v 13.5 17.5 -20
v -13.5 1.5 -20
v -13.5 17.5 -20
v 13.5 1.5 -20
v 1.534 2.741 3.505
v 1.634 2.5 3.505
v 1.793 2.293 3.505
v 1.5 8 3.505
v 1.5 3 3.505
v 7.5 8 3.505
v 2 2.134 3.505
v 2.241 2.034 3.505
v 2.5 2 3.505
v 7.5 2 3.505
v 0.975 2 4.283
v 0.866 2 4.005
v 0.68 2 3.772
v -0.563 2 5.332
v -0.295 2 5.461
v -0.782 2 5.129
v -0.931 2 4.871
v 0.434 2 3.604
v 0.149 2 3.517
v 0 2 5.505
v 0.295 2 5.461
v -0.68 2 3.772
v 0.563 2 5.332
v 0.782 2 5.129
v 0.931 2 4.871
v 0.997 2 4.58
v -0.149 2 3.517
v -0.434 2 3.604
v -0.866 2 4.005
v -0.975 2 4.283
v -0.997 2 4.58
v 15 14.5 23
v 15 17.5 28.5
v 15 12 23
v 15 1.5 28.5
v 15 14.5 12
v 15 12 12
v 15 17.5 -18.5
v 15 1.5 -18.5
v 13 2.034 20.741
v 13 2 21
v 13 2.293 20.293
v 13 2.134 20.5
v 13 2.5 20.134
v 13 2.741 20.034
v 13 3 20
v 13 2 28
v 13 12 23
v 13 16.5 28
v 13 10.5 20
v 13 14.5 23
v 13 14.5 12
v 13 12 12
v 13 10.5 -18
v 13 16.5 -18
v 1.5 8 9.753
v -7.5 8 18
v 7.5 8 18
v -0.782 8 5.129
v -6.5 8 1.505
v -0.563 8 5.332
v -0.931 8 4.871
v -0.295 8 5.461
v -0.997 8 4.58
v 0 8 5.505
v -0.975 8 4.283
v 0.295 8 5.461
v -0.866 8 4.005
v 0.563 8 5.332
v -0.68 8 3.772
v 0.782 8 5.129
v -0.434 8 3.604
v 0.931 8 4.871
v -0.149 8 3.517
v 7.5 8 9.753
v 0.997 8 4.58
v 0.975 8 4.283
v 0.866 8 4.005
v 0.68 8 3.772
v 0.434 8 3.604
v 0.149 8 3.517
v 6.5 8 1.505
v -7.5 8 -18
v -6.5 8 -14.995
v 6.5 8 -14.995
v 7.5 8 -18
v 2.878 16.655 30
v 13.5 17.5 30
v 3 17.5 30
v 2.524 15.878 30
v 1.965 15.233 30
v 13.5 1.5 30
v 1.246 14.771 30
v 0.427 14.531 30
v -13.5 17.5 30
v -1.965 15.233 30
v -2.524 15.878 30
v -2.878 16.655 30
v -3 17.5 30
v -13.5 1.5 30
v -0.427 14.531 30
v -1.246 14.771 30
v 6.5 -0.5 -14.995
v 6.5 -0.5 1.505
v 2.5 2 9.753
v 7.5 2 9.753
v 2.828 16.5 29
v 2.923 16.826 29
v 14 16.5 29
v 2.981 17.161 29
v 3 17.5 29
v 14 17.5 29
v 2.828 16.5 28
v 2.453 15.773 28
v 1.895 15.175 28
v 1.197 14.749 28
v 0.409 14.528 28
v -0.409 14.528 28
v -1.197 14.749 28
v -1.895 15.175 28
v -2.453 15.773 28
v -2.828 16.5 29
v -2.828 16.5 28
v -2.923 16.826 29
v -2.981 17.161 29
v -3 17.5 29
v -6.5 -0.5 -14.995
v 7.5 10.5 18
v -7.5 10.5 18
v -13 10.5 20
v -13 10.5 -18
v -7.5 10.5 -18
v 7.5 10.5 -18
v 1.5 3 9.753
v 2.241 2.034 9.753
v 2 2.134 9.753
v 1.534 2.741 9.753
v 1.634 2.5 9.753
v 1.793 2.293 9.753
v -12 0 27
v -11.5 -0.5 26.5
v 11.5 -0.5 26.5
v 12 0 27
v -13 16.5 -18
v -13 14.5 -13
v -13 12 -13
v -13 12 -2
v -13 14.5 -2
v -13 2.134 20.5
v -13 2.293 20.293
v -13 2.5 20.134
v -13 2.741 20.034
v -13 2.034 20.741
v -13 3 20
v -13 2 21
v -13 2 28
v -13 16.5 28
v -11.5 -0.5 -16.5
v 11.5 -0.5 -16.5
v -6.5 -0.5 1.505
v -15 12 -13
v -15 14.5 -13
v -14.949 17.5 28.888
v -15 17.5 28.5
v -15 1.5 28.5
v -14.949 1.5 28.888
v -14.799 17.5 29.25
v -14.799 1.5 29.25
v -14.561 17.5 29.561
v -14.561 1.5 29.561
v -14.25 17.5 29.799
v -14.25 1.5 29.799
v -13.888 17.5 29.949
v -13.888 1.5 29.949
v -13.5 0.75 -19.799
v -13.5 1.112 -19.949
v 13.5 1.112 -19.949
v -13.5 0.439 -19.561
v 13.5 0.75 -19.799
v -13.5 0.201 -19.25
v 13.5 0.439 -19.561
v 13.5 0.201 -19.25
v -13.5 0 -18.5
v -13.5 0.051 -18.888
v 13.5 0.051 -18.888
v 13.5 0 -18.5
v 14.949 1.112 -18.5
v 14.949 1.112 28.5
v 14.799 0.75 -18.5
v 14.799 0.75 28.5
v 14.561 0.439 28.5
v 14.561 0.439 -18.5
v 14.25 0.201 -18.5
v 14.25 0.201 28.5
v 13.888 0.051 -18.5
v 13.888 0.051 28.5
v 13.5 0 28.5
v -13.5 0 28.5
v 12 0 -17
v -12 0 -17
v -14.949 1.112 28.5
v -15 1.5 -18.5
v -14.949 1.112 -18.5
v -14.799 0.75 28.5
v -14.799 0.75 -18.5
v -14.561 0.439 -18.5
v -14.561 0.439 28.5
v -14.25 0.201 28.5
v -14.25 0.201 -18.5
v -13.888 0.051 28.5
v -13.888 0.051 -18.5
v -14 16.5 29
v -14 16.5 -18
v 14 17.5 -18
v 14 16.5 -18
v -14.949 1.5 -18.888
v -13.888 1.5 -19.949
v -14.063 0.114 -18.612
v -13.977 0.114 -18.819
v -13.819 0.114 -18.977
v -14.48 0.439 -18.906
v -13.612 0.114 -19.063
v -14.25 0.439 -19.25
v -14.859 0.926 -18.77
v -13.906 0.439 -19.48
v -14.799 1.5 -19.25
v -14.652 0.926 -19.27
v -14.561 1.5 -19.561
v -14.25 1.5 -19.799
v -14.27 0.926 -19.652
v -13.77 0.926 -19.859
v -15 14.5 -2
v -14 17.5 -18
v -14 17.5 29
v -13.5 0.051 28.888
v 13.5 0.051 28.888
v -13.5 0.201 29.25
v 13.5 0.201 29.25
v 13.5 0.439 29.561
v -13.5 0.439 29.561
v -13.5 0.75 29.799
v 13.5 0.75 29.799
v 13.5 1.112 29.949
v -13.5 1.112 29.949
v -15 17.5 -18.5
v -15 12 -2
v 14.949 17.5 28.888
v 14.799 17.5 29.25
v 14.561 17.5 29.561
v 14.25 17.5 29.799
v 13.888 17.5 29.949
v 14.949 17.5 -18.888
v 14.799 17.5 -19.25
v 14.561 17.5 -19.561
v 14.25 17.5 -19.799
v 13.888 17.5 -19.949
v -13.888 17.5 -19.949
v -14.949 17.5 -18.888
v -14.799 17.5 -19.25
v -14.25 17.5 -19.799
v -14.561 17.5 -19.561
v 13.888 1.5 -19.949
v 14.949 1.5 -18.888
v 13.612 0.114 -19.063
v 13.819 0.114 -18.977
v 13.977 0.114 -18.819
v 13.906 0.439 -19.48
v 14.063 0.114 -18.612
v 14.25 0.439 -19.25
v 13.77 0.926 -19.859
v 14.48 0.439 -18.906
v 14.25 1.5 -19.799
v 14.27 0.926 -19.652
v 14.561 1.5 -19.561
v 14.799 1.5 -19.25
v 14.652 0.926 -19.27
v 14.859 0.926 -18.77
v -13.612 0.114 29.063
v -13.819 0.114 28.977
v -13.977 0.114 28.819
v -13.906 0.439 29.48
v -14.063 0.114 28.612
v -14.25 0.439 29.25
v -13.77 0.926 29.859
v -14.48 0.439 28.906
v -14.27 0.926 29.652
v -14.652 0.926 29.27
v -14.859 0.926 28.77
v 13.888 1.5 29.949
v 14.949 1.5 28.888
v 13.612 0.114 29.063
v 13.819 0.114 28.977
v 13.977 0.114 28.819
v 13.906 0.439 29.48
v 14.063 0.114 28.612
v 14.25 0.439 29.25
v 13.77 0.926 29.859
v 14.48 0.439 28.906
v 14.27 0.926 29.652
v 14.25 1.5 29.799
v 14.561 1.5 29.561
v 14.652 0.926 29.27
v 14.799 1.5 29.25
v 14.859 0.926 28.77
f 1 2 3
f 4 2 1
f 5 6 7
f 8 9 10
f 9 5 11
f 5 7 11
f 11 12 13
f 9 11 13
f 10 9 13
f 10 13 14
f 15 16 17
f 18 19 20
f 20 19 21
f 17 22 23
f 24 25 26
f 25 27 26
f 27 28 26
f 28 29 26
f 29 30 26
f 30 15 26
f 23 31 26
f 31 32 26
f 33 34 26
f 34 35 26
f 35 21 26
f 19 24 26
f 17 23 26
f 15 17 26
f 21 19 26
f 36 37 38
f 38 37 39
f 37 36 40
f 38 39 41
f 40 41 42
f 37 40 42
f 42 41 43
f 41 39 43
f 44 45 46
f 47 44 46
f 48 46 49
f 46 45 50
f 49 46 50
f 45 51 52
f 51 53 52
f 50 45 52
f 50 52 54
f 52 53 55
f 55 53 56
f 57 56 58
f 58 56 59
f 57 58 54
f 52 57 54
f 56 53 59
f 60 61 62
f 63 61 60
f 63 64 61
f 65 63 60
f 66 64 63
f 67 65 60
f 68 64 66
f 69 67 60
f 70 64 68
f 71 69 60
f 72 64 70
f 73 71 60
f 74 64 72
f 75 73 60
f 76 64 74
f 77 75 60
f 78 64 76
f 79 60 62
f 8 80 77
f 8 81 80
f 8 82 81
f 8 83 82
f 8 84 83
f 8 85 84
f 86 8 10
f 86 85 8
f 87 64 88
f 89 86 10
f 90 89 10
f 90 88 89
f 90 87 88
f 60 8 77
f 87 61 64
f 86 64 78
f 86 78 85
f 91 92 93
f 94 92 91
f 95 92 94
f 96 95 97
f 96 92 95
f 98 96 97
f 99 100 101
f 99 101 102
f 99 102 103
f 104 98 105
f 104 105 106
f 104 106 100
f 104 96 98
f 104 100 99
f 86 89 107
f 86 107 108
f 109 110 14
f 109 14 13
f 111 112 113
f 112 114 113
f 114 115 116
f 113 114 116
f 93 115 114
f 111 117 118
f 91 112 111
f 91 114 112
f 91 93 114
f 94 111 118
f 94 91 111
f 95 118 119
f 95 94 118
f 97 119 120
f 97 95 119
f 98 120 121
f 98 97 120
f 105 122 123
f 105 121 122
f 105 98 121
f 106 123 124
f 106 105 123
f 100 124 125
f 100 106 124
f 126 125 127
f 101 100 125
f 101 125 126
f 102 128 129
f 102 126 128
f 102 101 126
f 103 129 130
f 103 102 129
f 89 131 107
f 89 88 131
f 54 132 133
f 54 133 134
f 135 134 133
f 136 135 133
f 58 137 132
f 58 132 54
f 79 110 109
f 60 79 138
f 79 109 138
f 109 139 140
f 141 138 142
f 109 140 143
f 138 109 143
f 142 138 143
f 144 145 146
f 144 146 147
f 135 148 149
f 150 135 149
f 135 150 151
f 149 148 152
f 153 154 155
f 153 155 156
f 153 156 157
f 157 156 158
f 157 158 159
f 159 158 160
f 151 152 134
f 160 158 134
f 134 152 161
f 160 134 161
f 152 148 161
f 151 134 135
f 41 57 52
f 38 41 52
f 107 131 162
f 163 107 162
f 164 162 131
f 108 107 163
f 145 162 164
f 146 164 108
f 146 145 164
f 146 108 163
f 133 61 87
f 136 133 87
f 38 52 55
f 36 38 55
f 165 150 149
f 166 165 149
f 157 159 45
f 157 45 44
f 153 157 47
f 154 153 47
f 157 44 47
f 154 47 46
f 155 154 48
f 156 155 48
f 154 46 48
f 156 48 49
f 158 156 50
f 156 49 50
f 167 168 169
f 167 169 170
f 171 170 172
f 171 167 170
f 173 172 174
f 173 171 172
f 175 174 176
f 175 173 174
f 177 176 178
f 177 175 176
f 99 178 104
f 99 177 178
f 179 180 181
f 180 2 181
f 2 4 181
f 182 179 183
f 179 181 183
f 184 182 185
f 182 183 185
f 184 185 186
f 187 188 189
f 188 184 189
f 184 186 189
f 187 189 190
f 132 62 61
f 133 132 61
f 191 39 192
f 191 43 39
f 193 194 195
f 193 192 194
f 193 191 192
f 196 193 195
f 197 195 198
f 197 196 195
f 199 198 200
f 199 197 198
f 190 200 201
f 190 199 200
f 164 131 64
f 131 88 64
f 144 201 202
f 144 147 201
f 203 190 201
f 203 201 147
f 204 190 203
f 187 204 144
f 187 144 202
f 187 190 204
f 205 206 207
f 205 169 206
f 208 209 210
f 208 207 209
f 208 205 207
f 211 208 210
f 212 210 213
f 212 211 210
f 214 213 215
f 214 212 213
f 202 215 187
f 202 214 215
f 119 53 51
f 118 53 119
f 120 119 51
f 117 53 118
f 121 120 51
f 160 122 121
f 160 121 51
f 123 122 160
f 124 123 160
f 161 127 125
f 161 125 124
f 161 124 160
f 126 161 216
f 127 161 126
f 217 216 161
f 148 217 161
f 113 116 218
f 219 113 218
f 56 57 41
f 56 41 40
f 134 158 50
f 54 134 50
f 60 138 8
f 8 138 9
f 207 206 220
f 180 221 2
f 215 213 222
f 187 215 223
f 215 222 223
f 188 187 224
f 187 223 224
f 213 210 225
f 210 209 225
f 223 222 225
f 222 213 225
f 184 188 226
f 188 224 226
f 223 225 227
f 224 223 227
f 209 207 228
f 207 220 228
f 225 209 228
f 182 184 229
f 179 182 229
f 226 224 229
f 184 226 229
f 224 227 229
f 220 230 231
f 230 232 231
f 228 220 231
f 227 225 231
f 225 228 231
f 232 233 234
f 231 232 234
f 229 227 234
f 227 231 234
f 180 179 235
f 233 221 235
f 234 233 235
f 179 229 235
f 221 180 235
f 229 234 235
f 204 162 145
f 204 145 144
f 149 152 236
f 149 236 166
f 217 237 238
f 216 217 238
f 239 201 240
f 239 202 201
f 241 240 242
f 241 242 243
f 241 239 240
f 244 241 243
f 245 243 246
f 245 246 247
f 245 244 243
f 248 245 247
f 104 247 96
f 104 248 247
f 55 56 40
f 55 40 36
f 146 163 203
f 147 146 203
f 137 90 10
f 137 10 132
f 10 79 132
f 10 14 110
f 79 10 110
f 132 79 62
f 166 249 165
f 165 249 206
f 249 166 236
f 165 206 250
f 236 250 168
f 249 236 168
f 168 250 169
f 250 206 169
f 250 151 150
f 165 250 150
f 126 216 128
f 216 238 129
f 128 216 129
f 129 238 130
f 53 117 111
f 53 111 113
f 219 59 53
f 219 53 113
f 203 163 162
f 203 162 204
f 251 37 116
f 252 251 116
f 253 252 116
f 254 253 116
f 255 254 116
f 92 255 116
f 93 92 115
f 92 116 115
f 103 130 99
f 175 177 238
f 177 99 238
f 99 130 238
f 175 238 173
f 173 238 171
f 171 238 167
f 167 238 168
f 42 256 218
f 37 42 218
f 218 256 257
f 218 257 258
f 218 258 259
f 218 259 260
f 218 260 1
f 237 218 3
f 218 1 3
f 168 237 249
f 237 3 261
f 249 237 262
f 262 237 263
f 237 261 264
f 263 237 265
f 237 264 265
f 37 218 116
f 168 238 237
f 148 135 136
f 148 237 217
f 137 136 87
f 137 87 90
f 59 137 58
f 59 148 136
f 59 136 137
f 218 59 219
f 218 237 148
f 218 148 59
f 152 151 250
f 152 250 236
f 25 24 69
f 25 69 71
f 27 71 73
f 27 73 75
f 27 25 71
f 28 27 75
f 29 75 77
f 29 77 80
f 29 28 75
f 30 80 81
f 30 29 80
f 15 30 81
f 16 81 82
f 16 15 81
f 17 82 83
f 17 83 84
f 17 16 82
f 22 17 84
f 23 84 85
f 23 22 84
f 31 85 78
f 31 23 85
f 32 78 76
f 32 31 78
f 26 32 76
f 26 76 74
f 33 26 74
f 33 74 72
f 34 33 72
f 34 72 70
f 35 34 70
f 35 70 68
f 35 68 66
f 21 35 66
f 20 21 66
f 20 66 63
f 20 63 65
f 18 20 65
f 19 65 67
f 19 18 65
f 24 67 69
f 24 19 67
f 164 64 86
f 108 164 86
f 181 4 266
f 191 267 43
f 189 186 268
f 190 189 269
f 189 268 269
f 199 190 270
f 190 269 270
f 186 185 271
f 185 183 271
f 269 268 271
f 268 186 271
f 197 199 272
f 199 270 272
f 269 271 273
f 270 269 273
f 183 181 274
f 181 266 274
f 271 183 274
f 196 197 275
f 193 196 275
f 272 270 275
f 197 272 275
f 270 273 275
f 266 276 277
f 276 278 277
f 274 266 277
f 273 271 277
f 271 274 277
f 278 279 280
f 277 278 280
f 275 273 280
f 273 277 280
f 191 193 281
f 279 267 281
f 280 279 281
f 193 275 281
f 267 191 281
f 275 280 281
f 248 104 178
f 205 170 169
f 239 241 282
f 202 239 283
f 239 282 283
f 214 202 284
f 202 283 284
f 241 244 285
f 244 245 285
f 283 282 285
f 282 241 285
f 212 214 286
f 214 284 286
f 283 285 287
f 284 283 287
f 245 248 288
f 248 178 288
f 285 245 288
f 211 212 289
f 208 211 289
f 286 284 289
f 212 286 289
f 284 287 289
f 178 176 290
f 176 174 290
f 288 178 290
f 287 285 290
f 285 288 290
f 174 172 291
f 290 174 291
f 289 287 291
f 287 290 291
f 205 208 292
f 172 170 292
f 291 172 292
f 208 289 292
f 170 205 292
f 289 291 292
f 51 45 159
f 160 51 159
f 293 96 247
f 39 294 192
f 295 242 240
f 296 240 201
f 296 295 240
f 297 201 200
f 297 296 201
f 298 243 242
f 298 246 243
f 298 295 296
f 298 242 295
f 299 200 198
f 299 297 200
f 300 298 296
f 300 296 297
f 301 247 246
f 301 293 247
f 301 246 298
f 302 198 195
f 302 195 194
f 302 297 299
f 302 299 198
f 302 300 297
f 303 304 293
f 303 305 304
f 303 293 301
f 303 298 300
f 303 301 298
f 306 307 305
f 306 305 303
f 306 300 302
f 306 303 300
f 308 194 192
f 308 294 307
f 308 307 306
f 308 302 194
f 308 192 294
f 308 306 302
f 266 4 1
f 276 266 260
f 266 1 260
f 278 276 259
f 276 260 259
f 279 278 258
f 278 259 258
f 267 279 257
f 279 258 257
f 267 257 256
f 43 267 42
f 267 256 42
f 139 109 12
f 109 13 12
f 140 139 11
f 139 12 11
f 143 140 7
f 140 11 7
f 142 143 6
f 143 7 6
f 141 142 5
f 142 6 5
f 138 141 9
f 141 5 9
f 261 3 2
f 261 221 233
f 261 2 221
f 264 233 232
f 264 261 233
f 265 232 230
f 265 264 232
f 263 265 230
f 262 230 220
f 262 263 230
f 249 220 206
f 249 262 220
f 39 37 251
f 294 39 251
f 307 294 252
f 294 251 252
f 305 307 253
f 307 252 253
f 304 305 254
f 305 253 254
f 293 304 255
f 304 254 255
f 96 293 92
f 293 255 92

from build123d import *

# Parameters (mm, degrees)
BOSS_EXTRUDE1_DEPTH  = 17.5
CUT_EXTRUDE1_DEPTH   = 15.5
FILLET2_R            = 1.5
CUT_EXTRUDE4_REACH   = 46.612
SKETCH5_W            = 11
SKETCH5_H            = 2.5
CUT_EXTRUDE5_REACH   = 46.612
SKETCH6_W            = 11
SKETCH6_H            = 2.5
CUT_EXTRUDE6_DEPTH   = 1
BOSS_EXTRUDE7_DEPTH  = 8.5
SKETCH3_11_R         = 1
BOSS_EXTRUDE8_DEPTH  = 6
CUT_EXTRUDE8_REACH   = 38.949
SKETCH3_12_W         = 13
SKETCH3_12_H         = 16.5
BOSS_EXTRUDE9_DEPTH  = 8.5
CUT_EXTRUDE9_REACH   = 57.057
SKETCH11_W           = 25
SKETCH11_H           = 45
SKETCH11_W_2         = 13
SKETCH11_H_2         = 16.5
BOSS_EXTRUDE10_DEPTH = 0.5
CHAMFER1_SIZE        = 1
FILLET3_R            = 1


with BuildPart() as part:
    # Sketch1 → Boss-Extrude1 (new body)
    with BuildSketch(Plane(origin=(0, 0, 0), x_dir=(1, 0, 0), z_dir=(0, 1, 0))):
        Polygon((-15, 20), (15, 20), (15, -20), (15, -30), (-15, -30), (-15, -20), align=None)
    extrude(amount=BOSS_EXTRUDE1_DEPTH)

    # Sketch2 → Cut-Extrude1 (cut)
    with BuildSketch(Plane(origin=(0, 17.5, 0), x_dir=(1, 0, 0), z_dir=(0, 1, 0))):
        Polygon((-13, 18), (13, 18), (13, -18), (13, -28), (-13, -28), (-13, -18), align=None)
    extrude(amount=-CUT_EXTRUDE1_DEPTH, mode=Mode.SUBTRACT)

    # Fillet2
    fillet2_edges = [part.edges().sort_by_distance(p)[0] for p in [
        (15, 8.75, 30),
        (-15, 8.75, 30),
        (-15, 8.75, -20),
        (15, 8.75, -20),
        (0, 0, 30),
        (-15, 0, 5),
        (0, 0, -20),
        (15, 0, 5),
    ]]
    fillet(fillet2_edges, radius=FILLET2_R)

    # Sketch5 → Cut-Extrude4 (cut, up to next)
    with BuildSketch(Plane.ZY.offset(-13), mode=Mode.PRIVATE) as cut_extrude4_sk1:
        with Locations((17.5, 13.25)):
            Rectangle(SKETCH5_W, SKETCH5_H)
    cut_extrude4_tool1 = extrude(cut_extrude4_sk1.sketch, amount=-CUT_EXTRUDE4_REACH, mode=Mode.PRIVATE) & part.part
    add(cut_extrude4_tool1.solids().sort_by_distance((13, 13.25, 17.5))[0], mode=Mode.SUBTRACT)

    # Sketch6 → Cut-Extrude5 (cut, up to next)
    with BuildSketch(Plane(origin=(-13, 0, 0), x_dir=(0, 0, -1), z_dir=(1, 0, 0)), mode=Mode.PRIVATE) as cut_extrude5_sk1:
        with Locations((7.5, 13.25)):
            Rectangle(SKETCH6_W, SKETCH6_H)
    cut_extrude5_tool1 = extrude(cut_extrude5_sk1.sketch, amount=-CUT_EXTRUDE5_REACH, mode=Mode.PRIVATE) & part.part
    add(cut_extrude5_tool1.solids().sort_by_distance((-13, 13.25, -7.5))[0], mode=Mode.SUBTRACT)

    # Sketch7 → Cut-Extrude6 (cut)
    with BuildSketch(Plane(origin=(0, 17.5, 0), x_dir=(1, 0, 0), z_dir=(0, 1, 0))):
        Polygon((-13, 18), (-14, 18), (-14, -19), (-14, -29), (14, -29), (14, -19), (14, 18), (13, 18), (13, -18), (13, -28), (-13, -28), (-13, -18), align=None)
    extrude(amount=-CUT_EXTRUDE6_DEPTH, mode=Mode.SUBTRACT)

    # Sketch3 → Boss-Extrude7 (add)
    with BuildSketch(Plane(origin=(0, 2, 0), x_dir=(1, 0, 0), z_dir=(0, 1, 0))):
        Polygon((-7.5, -2.505360959), (-7.5, -1.505360959), (-7.5, 18), (-13, 18), (-13, -18), (-7.5, -18), (-7.5, -6.505360959), align=None)
        Polygon((7.5, -2.505360959), (7.5, -3.505360959), (7.5, -6.505360959), (7.5, -9.752680479), (7.5, -18), (13, -18), (13, 18), (7.5, 18), (7.5, -1.505360959), align=None)
    extrude(amount=BOSS_EXTRUDE7_DEPTH)

    # Sketch3<11> → Boss-Extrude8 (add)
    # profile 1 of 3: a face of its own
    with BuildSketch(Plane(origin=(0, 2, 0), x_dir=(1, 0, 0), z_dir=(0, 1, 0))):
        Polygon((1.5, -1.505360959), (-6.5, -1.505360959), (-7.5, -1.505360959), (-7.5, -2.505360959), (-7.5, -6.505360959), (-7.5, -18), (-1.5, -18), (1.5, -18), (7.5, -18), (7.5, -9.752680479), (1.5, -9.752680479), (1.5, -3.505360959), align=None)
        with Locations(Location((0, -4.505360959, 0), (0, 0, 270))):
            Circle(SKETCH3_11_R, mode=Mode.SUBTRACT)
    # profile 2 of 3: a face of its own
    with BuildSketch(Plane(origin=(0, 2, 0), x_dir=(1, 0, 0), z_dir=(0, 1, 0))):
        Polygon((-7.5, -1.505360959), (-6.5, -1.505360959), (-6.5, 14.994639041), (6.5, 14.994639041), (6.5, -1.505360959), (7.5, -1.505360959), (7.5, 18), (-7.5, 18), align=None)
    # profile 3 of 3: a face of its own
    with BuildSketch(Plane(origin=(0, 2, 0), x_dir=(1, 0, 0), z_dir=(0, 1, 0))):
        Polygon((6.214337826, -1.505360959), (1.5, -1.505360959), (1.5, -3.505360959), (7.5, -3.505360959), (7.5, -2.505360959), (7.5, -1.505360959), (6.5, -1.505360959), align=None)
    extrude(amount=BOSS_EXTRUDE8_DEPTH)

    # Sketch3<12> → Cut-Extrude8 (cut, up to next)
    with BuildSketch(Plane(origin=(0, 2, 0), x_dir=(1, 0, 0), z_dir=(0, 1, 0)), mode=Mode.PRIVATE) as cut_extrude8_sk1:
        with Locations((0, 6.744639041)):
            Rectangle(SKETCH3_12_W, SKETCH3_12_H)
    cut_extrude8_tool1 = extrude(cut_extrude8_sk1.sketch, amount=-CUT_EXTRUDE8_REACH, mode=Mode.PRIVATE) & part.part
    add(cut_extrude8_tool1.solids().sort_by_distance((0, 2, -6.744639))[0], mode=Mode.SUBTRACT)

    # Sketch3<13> → Boss-Extrude9 (add)
    with BuildSketch(Plane(origin=(0, 2, 0), x_dir=(1, 0, 0), z_dir=(0, 1, 0))):
        Polygon((-7.5, -18), (-13, -18), (-13, -20), (13, -20), (13, -18), (7.5, -18), (1.5, -18), (-1.5, -18), align=None)
    extrude(amount=BOSS_EXTRUDE9_DEPTH)

    # Sketch10 → Cut-Extrude9 (cut, up to next)
    with BuildSketch(Plane.XY.offset(30), mode=Mode.PRIVATE) as cut_extrude9_sk1:
        with BuildLine():
            Line((-3, 17.5), (3, 17.5))
            ThreePointArc((3, 17.5), (0, 14.5), (-3, 17.5))
        make_face()
    cut_extrude9_tool1 = extrude(cut_extrude9_sk1.sketch, amount=-CUT_EXTRUDE9_REACH, mode=Mode.PRIVATE) & part.part
    add(cut_extrude9_tool1.solids().sort_by_distance((0, 16.22676, 30))[0], mode=Mode.SUBTRACT)

    # Sketch11 → Boss-Extrude10 (add)
    with BuildSketch(Plane.XZ):
        with Locations((0, 5)):
            Rectangle(SKETCH11_W, SKETCH11_H)
        with Locations((0, -6.744639041)):
            Rectangle(SKETCH11_W_2, SKETCH11_H_2, mode=Mode.SUBTRACT)
    extrude(amount=BOSS_EXTRUDE10_DEPTH)

    # Chamfer1
    # the kernel refuses this chamfer: 1 mm, written as the material it takes off along each edge
    with BuildSketch(Plane(origin=(-15.071682988, -0.5, 27.5), x_dir=(0, -0.027495876610586403, -0.9996219169112968), z_dir=(1, 0, 0))) as chamfer1_piece_1_section:
        Polygon((CHAMFER1_SIZE * 0.999621916911, CHAMFER1_SIZE * 0.0274958766106), (-CHAMFER1_SIZE * 0.0274958766106, CHAMFER1_SIZE * 0.999621916911), (0, 0), align=None)
    chamfer1_piece_1 = extrude(amount=30.143365976, mode=Mode.PRIVATE)
    chamfer1_piece_1 = split(chamfer1_piece_1, bisect_by=Plane(origin=(0, 0, 27.106598916), z_dir=(0, -1, 0)), keep=Keep.TOP, mode=Mode.PRIVATE)
    add(chamfer1_piece_1, mode=Mode.SUBTRACT)
    with BuildSketch(Plane(origin=(-12.5, -0.5, -20.071682988), x_dir=(0.9996219169112968, -0.027495876610586403, 0), z_dir=(0, 0, 1))) as chamfer1_piece_2_section:
        Polygon((CHAMFER1_SIZE * 0.999621916911, CHAMFER1_SIZE * 0.0274958766106), (-CHAMFER1_SIZE * 0.0274958766106, CHAMFER1_SIZE * 0.999621916911), (0, 0), align=None)
    chamfer1_piece_2 = extrude(amount=50.143365976, mode=Mode.PRIVATE)
    chamfer1_piece_2 = split(chamfer1_piece_2, bisect_by=Plane(origin=(-12.106598916, 0, 5), z_dir=(0, -1, 0)), keep=Keep.TOP, mode=Mode.PRIVATE)
    add(chamfer1_piece_2, mode=Mode.SUBTRACT)
    with BuildSketch(Plane(origin=(12.5, -0.5, 30.071682988), x_dir=(-0.9996219169112968, -0.027495876610586403, 0), z_dir=(0, 0, -1))) as chamfer1_piece_3_section:
        Polygon((CHAMFER1_SIZE * 0.999621916911, CHAMFER1_SIZE * 0.0274958766106), (-CHAMFER1_SIZE * 0.0274958766106, CHAMFER1_SIZE * 0.999621916911), (0, 0), align=None)
    chamfer1_piece_3 = extrude(amount=50.143365976, mode=Mode.PRIVATE)
    chamfer1_piece_3 = split(chamfer1_piece_3, bisect_by=Plane(origin=(12.106598916, 0, 5), z_dir=(0, -1, 0)), keep=Keep.TOP, mode=Mode.PRIVATE)
    add(chamfer1_piece_3, mode=Mode.SUBTRACT)
    with BuildSketch(Plane(origin=(15.071682988, -0.5, -17.5), x_dir=(0, -0.027495876610586403, 0.9996219169112968), z_dir=(-1, 0, 0))) as chamfer1_piece_4_section:
        Polygon((CHAMFER1_SIZE * 0.999621916911, CHAMFER1_SIZE * 0.0274958766106), (-CHAMFER1_SIZE * 0.0274958766106, CHAMFER1_SIZE * 0.999621916911), (0, 0), align=None)
    chamfer1_piece_4 = extrude(amount=30.143365976, mode=Mode.PRIVATE)
    chamfer1_piece_4 = split(chamfer1_piece_4, bisect_by=Plane(origin=(0, 0, -17.106598916), z_dir=(0, -1, 0)), keep=Keep.TOP, mode=Mode.PRIVATE)
    add(chamfer1_piece_4, mode=Mode.SUBTRACT)

    # Fillet3
    fillet3_edges = [part.edges().sort_by_distance(p)[0] for p in [
        (1.5, 2, 6.629020719),
        (0, 2, 20),
    ]]
    fillet(fillet3_edges, radius=FILLET3_R)


solid = part.part
